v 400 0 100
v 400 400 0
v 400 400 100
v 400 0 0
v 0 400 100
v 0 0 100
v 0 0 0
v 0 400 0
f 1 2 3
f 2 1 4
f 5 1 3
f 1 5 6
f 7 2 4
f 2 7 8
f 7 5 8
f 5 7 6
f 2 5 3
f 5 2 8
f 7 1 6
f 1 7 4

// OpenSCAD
//Aalto Logo Generator

//Configurables
LogoOption = rands(0, 2, 1); //random number generator. 0 = ?, 1 = !, 2 = ". Input a number directly if you want one thing in particular. Note, Aalto Visual Design Guidelines at date of writing specify this -should- be random. 

h=100; //extrusion height, in mm
s=1; //scale
o=-1; //offset
x = 400; //box horizontal size. Enter 0 for no box.
y = 400; //box vertical size. Enter 0 for no box.



//Generator - don't need to edit below here.
if(x > 0){
difference(){cube([x*s,y*s,h]);
{
if(round(LogoOption[0]) == 0) Question(1.1*h,s,o,x,y);
if(round(LogoOption[0]) == 1) Exclame(1.1*h,s,o,x,y);
if(round(LogoOption[0]) == 2) Quote(1.1*h,s,o,x,y);}}
}

else {
if(round(LogoOption[0]) == 0) Question(1.1*h,s,o,x,y);
if(round(LogoOption[0]) == 1) Exclame(1.1*h,s,o,x,y);
if(round(LogoOption[0]) == 2) Quote(1.1*h,s,o,x,y);
}
module Question(h,s,offs,x,y) {
    translate([x/5,y/3,offs])
    linear_extrude(height = h, convexity = 4)
    import("Aalto_logo_question.dxf",scale = s); 
}

module Exclame(h,s,offs,x,y) {
    translate([x/5,y/3,offs])
    linear_extrude(height = h, convexity = 4)
    import("Aalto_logo_exclame.dxf",scale = s); 
}

module Quote(h,s,offs,x,y) {
    translate([x/5,y/3,offs])
    linear_extrude(height = h, convexity = 4)
    import("Aalto_logo_quote.dxf",scale = s); 
}
